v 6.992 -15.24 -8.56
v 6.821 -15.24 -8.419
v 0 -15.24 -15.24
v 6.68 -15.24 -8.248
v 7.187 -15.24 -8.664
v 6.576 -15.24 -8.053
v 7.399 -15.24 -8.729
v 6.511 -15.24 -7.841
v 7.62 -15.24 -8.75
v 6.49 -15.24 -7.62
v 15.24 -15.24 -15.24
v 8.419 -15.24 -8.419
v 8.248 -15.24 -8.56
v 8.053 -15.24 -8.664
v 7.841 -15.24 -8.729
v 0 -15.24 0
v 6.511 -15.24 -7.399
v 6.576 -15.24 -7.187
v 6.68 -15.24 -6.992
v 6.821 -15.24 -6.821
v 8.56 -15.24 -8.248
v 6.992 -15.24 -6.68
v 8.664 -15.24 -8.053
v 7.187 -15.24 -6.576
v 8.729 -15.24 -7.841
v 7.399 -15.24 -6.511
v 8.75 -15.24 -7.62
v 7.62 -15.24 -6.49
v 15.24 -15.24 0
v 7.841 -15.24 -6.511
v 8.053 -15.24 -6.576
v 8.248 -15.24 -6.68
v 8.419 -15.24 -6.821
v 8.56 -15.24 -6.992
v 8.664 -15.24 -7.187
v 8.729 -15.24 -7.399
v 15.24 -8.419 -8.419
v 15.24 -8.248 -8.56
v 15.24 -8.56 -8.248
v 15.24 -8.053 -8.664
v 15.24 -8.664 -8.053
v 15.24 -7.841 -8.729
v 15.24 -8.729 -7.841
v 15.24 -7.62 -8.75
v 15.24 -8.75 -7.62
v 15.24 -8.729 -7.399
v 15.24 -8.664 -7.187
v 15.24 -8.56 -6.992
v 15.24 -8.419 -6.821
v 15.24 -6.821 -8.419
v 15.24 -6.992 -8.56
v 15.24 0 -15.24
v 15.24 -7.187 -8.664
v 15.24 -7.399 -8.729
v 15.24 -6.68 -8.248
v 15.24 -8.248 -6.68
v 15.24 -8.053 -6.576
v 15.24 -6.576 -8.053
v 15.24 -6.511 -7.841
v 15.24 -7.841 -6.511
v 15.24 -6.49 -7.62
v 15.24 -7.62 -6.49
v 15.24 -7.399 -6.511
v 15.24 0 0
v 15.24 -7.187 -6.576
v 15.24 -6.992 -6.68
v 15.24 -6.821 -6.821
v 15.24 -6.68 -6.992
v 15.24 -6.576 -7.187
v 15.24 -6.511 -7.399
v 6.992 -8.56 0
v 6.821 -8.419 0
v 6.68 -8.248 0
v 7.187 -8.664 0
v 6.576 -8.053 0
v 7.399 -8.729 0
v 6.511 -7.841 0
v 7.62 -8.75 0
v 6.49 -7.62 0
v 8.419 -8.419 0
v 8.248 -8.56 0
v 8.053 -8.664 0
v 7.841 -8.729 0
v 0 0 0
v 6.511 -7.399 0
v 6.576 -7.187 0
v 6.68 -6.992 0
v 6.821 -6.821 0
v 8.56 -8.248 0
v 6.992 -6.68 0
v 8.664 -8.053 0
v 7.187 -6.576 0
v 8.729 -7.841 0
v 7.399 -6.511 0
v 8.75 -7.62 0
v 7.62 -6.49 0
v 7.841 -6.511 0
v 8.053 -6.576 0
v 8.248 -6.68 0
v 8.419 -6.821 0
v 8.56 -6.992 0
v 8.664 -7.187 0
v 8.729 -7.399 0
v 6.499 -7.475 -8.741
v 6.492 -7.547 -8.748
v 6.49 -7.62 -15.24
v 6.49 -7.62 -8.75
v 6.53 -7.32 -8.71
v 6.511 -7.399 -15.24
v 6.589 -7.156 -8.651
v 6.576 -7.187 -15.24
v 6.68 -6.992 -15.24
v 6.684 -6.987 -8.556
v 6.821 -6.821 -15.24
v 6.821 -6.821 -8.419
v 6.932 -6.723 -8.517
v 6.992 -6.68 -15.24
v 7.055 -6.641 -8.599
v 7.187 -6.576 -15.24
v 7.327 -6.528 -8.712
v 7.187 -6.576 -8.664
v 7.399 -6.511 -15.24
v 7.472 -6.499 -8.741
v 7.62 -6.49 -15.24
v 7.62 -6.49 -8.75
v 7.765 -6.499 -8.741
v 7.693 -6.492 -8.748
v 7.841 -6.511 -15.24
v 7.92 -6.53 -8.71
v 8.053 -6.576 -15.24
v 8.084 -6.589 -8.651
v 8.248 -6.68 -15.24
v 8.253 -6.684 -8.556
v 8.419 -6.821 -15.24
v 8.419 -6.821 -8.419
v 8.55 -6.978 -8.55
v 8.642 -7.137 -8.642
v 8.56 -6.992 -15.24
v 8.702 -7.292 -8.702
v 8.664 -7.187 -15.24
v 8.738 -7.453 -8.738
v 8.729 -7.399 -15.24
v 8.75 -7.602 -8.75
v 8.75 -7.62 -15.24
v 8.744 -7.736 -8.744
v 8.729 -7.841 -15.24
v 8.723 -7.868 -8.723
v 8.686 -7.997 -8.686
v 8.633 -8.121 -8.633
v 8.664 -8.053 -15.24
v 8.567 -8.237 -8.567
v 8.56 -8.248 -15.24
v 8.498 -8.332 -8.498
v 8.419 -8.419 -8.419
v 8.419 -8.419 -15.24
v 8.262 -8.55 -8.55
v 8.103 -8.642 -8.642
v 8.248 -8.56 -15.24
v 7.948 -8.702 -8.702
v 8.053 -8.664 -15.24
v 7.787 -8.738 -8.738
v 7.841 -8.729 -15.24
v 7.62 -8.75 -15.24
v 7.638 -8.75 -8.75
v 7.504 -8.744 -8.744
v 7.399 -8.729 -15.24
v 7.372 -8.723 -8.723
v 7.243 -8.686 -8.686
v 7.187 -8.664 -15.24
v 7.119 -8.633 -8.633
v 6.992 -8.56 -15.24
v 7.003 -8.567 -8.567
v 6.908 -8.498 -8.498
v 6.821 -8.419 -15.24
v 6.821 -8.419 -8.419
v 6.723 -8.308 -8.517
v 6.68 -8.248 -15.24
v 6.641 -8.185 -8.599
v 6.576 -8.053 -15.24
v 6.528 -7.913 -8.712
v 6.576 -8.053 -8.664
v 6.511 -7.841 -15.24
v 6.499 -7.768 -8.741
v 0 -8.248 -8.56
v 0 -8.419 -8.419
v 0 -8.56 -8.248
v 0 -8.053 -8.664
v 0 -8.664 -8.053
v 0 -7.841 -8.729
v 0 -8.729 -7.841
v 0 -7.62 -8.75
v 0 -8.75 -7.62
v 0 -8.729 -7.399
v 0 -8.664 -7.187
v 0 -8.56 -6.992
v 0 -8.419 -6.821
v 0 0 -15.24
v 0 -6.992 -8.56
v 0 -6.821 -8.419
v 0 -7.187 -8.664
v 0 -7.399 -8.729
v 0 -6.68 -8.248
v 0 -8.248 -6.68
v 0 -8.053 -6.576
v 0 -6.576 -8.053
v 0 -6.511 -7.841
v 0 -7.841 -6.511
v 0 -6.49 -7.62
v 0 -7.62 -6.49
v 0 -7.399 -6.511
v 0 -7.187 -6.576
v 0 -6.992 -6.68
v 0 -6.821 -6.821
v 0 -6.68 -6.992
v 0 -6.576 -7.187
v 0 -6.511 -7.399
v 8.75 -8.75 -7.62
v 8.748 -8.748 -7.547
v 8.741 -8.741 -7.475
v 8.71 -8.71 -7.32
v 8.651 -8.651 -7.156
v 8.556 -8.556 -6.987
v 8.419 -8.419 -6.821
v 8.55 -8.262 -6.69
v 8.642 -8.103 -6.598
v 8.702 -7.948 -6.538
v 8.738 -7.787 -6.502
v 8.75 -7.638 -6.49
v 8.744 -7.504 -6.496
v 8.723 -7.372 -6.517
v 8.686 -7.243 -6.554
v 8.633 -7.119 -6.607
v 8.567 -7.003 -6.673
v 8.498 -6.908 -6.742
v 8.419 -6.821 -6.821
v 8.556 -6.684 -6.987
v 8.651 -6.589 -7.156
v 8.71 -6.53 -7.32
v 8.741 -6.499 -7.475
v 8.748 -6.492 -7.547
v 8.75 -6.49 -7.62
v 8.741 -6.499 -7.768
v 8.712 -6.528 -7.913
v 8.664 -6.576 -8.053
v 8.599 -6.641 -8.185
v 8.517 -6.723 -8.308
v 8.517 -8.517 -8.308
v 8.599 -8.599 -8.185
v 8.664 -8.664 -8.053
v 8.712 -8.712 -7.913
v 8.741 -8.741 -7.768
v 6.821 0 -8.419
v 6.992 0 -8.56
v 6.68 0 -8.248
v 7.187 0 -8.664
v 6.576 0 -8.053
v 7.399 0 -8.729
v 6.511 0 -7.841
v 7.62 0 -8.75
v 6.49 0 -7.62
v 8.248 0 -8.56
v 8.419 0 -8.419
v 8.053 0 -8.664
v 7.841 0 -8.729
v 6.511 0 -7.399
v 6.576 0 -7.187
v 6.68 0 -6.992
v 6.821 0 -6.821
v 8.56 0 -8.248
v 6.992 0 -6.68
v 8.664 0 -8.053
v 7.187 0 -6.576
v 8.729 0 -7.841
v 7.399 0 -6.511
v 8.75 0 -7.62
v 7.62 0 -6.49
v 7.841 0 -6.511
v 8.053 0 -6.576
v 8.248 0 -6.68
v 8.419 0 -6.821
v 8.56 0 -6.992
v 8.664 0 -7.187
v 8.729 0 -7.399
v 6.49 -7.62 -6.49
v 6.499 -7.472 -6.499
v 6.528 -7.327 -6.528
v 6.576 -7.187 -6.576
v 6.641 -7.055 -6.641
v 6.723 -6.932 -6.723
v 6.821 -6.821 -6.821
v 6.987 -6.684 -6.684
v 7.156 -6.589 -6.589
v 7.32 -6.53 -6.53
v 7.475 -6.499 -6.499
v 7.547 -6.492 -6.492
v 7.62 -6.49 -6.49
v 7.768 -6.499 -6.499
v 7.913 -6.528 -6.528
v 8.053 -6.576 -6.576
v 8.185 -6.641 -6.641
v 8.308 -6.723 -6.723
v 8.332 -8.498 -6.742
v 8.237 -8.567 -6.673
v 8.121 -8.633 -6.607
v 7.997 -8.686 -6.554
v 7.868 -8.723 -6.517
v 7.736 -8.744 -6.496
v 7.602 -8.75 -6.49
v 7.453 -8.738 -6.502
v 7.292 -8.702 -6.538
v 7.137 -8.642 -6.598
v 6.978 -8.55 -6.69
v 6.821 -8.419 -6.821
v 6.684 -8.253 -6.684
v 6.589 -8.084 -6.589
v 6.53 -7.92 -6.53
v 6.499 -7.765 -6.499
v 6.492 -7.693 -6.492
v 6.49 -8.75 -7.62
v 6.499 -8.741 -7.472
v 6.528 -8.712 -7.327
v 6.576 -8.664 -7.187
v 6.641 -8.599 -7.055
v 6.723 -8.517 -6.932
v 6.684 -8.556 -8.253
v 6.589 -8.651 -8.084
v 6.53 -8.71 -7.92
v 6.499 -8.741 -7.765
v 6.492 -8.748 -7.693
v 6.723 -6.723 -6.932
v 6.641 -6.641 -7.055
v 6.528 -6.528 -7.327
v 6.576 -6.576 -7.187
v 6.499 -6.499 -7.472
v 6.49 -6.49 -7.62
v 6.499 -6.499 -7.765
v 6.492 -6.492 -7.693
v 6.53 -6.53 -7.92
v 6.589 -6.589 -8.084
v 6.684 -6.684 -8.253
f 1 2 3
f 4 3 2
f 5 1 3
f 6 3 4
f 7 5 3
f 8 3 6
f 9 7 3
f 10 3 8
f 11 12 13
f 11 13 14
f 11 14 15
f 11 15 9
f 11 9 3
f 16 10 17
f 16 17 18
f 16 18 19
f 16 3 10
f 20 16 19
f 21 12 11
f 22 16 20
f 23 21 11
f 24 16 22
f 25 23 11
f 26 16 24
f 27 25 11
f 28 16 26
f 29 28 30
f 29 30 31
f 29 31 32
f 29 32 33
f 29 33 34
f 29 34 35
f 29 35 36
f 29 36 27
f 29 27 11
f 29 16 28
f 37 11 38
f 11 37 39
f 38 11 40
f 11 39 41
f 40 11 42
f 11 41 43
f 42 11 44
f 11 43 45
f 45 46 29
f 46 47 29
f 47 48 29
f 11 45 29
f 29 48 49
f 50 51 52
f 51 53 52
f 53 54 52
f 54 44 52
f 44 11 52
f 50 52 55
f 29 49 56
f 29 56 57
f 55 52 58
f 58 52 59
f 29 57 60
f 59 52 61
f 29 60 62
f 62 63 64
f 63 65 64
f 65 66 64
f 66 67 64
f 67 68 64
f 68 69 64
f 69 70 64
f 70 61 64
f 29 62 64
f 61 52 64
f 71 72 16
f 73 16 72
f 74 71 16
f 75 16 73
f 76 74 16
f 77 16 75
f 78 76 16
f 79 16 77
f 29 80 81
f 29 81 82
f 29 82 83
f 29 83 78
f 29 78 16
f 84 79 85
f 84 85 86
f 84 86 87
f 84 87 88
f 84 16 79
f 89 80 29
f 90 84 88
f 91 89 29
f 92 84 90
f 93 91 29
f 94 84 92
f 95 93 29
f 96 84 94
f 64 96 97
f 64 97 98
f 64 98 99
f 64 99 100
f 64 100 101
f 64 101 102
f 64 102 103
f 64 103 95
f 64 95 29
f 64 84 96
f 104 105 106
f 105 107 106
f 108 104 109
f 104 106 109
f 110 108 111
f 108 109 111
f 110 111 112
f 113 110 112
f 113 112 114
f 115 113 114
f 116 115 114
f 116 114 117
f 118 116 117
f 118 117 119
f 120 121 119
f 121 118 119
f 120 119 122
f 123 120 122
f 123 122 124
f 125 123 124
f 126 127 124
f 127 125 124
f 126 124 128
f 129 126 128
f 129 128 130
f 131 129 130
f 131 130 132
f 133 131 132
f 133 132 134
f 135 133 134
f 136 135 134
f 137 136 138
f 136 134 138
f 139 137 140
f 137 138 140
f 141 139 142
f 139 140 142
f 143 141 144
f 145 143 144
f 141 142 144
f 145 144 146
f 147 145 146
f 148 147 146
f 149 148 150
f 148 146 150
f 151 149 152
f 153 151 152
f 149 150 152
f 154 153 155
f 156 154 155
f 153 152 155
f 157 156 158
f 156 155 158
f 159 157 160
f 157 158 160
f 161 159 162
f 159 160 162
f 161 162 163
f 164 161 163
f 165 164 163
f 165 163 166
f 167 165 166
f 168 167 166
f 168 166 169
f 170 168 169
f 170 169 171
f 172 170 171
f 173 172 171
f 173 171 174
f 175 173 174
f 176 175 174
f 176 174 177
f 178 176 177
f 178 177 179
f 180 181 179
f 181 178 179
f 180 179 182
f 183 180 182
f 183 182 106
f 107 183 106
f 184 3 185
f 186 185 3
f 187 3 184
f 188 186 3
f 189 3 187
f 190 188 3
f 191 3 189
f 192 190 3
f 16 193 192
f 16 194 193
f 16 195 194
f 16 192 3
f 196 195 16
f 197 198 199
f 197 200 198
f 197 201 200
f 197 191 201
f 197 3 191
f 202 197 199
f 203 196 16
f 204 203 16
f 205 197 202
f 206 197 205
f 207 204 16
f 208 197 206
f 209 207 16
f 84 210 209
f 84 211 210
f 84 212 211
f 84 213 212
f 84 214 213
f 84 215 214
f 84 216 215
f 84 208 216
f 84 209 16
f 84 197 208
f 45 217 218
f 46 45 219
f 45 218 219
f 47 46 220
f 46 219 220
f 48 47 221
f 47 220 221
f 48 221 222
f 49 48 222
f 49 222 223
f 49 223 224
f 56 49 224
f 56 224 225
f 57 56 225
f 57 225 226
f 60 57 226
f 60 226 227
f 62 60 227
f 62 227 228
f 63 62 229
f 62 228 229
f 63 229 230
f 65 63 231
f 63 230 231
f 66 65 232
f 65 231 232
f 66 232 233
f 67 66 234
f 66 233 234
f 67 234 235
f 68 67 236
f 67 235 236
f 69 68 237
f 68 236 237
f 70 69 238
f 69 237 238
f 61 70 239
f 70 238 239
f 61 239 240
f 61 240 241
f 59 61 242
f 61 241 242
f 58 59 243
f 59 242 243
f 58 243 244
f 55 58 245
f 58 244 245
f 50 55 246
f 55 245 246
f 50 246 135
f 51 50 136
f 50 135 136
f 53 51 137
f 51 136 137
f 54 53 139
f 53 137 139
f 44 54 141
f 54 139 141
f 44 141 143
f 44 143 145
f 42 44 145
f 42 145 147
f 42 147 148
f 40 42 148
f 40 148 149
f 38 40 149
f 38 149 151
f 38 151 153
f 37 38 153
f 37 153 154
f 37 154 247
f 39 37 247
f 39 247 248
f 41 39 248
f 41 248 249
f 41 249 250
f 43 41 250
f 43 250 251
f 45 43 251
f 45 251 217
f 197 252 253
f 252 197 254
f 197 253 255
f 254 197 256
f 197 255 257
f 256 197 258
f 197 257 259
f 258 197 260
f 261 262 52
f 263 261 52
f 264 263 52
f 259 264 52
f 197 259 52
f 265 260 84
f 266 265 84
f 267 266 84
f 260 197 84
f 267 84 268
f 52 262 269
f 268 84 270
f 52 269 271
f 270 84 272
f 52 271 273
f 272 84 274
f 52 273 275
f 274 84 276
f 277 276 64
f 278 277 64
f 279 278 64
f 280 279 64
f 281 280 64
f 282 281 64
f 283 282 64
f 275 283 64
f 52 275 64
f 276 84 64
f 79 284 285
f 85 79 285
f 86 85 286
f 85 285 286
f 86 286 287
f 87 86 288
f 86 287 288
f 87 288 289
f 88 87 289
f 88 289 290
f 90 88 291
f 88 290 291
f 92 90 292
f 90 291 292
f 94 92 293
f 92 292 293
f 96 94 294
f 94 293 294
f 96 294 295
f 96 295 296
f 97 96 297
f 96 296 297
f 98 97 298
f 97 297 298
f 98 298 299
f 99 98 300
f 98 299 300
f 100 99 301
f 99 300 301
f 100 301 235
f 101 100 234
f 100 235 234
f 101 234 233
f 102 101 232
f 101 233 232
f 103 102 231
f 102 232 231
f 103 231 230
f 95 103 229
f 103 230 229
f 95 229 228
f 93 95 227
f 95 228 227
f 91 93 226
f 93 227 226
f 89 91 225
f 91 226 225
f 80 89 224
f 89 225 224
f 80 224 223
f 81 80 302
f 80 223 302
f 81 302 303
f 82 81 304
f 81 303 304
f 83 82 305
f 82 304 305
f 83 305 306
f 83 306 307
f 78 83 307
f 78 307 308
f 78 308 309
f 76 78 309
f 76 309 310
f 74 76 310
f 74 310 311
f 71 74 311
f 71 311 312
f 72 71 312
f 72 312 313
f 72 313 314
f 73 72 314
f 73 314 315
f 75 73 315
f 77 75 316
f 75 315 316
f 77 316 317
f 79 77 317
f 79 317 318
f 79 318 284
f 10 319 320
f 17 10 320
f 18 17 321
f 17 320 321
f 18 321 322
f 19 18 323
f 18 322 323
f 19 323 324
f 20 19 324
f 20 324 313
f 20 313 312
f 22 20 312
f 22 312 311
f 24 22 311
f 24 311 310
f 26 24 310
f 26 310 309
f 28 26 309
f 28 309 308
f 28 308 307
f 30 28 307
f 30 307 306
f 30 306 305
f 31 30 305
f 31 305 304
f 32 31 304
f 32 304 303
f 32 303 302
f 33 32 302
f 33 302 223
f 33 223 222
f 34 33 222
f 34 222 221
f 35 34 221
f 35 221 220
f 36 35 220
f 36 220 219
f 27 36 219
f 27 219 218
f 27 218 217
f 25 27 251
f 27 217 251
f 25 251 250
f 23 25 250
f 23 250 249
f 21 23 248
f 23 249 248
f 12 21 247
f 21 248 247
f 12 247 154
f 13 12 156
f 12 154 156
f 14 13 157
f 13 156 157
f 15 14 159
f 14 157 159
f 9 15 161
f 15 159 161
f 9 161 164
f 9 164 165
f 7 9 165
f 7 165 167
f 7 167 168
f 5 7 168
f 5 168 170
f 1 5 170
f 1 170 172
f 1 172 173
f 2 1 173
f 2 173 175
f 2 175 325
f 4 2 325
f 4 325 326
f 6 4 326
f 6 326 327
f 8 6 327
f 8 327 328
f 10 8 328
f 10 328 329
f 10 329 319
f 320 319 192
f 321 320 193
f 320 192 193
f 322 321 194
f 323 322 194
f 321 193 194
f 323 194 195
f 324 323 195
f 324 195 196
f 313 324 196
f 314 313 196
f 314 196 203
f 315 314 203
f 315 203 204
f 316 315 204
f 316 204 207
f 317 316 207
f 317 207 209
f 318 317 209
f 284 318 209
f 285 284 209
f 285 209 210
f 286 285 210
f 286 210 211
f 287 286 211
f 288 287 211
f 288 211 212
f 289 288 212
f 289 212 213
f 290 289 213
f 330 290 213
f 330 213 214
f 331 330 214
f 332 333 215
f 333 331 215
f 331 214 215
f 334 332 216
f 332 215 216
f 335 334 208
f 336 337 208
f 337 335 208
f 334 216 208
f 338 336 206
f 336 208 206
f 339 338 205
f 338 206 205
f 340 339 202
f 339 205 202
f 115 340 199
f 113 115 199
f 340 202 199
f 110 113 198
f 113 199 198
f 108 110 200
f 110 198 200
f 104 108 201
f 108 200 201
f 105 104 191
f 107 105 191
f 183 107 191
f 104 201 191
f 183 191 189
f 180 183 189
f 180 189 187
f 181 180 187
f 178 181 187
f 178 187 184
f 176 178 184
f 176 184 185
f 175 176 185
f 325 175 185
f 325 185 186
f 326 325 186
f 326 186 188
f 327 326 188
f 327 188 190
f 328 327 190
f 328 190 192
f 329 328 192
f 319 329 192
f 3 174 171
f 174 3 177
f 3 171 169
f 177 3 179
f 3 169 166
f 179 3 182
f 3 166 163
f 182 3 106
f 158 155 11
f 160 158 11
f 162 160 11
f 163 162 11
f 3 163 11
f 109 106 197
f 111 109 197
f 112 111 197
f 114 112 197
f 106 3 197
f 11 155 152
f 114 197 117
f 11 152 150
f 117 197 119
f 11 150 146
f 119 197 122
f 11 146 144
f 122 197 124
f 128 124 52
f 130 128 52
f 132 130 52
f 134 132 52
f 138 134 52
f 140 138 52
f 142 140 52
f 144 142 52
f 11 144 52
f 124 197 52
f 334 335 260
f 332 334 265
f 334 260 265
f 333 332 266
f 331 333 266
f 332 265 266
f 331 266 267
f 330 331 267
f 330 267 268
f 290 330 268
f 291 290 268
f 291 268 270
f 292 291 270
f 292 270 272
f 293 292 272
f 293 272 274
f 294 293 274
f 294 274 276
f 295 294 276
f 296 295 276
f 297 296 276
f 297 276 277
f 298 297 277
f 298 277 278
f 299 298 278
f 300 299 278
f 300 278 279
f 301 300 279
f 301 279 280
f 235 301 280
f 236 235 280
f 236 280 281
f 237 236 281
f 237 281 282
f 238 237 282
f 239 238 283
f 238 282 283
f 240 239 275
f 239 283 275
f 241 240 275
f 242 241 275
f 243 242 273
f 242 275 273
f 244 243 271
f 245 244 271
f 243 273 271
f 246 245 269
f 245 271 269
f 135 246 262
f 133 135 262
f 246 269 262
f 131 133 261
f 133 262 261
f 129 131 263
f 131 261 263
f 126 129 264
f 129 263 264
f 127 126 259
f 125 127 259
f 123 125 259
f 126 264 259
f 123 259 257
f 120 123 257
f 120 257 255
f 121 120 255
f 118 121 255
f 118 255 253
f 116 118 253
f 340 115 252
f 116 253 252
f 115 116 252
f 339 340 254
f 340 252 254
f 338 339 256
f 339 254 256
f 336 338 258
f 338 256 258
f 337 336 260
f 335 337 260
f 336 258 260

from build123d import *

# Parameters (mm, degrees)
F0_W     = 15.24
F0_H     = 15.24
F1_DEPTH = 15.24
F5_D     = 2.2606
F6_D     = 2.2606
F7_D     = 2.2606


with BuildPart() as f1:
    # F0 (on Front) → F1 (new body)
    with BuildSketch(Plane.XZ):
        with Locations((7.62, -7.62)):
            Rectangle(F0_W, F0_H)
    extrude(amount=F1_DEPTH)

    # F5 (through all)
    with Locations(Plane.XZ.offset(15.24)):
        with Locations((7.62, -7.62)):
            Hole(F5_D / 2)

    # F6 (through all)
    with Locations(Plane.YZ.offset(15.24)):
        with Locations((-7.62, -7.62)):
            Hole(F6_D / 2)

    # F7 (through all)
    with Locations(Plane.XY):
        with Locations((7.62, -7.62)):
            Hole(F7_D / 2)


solid = f1.part
